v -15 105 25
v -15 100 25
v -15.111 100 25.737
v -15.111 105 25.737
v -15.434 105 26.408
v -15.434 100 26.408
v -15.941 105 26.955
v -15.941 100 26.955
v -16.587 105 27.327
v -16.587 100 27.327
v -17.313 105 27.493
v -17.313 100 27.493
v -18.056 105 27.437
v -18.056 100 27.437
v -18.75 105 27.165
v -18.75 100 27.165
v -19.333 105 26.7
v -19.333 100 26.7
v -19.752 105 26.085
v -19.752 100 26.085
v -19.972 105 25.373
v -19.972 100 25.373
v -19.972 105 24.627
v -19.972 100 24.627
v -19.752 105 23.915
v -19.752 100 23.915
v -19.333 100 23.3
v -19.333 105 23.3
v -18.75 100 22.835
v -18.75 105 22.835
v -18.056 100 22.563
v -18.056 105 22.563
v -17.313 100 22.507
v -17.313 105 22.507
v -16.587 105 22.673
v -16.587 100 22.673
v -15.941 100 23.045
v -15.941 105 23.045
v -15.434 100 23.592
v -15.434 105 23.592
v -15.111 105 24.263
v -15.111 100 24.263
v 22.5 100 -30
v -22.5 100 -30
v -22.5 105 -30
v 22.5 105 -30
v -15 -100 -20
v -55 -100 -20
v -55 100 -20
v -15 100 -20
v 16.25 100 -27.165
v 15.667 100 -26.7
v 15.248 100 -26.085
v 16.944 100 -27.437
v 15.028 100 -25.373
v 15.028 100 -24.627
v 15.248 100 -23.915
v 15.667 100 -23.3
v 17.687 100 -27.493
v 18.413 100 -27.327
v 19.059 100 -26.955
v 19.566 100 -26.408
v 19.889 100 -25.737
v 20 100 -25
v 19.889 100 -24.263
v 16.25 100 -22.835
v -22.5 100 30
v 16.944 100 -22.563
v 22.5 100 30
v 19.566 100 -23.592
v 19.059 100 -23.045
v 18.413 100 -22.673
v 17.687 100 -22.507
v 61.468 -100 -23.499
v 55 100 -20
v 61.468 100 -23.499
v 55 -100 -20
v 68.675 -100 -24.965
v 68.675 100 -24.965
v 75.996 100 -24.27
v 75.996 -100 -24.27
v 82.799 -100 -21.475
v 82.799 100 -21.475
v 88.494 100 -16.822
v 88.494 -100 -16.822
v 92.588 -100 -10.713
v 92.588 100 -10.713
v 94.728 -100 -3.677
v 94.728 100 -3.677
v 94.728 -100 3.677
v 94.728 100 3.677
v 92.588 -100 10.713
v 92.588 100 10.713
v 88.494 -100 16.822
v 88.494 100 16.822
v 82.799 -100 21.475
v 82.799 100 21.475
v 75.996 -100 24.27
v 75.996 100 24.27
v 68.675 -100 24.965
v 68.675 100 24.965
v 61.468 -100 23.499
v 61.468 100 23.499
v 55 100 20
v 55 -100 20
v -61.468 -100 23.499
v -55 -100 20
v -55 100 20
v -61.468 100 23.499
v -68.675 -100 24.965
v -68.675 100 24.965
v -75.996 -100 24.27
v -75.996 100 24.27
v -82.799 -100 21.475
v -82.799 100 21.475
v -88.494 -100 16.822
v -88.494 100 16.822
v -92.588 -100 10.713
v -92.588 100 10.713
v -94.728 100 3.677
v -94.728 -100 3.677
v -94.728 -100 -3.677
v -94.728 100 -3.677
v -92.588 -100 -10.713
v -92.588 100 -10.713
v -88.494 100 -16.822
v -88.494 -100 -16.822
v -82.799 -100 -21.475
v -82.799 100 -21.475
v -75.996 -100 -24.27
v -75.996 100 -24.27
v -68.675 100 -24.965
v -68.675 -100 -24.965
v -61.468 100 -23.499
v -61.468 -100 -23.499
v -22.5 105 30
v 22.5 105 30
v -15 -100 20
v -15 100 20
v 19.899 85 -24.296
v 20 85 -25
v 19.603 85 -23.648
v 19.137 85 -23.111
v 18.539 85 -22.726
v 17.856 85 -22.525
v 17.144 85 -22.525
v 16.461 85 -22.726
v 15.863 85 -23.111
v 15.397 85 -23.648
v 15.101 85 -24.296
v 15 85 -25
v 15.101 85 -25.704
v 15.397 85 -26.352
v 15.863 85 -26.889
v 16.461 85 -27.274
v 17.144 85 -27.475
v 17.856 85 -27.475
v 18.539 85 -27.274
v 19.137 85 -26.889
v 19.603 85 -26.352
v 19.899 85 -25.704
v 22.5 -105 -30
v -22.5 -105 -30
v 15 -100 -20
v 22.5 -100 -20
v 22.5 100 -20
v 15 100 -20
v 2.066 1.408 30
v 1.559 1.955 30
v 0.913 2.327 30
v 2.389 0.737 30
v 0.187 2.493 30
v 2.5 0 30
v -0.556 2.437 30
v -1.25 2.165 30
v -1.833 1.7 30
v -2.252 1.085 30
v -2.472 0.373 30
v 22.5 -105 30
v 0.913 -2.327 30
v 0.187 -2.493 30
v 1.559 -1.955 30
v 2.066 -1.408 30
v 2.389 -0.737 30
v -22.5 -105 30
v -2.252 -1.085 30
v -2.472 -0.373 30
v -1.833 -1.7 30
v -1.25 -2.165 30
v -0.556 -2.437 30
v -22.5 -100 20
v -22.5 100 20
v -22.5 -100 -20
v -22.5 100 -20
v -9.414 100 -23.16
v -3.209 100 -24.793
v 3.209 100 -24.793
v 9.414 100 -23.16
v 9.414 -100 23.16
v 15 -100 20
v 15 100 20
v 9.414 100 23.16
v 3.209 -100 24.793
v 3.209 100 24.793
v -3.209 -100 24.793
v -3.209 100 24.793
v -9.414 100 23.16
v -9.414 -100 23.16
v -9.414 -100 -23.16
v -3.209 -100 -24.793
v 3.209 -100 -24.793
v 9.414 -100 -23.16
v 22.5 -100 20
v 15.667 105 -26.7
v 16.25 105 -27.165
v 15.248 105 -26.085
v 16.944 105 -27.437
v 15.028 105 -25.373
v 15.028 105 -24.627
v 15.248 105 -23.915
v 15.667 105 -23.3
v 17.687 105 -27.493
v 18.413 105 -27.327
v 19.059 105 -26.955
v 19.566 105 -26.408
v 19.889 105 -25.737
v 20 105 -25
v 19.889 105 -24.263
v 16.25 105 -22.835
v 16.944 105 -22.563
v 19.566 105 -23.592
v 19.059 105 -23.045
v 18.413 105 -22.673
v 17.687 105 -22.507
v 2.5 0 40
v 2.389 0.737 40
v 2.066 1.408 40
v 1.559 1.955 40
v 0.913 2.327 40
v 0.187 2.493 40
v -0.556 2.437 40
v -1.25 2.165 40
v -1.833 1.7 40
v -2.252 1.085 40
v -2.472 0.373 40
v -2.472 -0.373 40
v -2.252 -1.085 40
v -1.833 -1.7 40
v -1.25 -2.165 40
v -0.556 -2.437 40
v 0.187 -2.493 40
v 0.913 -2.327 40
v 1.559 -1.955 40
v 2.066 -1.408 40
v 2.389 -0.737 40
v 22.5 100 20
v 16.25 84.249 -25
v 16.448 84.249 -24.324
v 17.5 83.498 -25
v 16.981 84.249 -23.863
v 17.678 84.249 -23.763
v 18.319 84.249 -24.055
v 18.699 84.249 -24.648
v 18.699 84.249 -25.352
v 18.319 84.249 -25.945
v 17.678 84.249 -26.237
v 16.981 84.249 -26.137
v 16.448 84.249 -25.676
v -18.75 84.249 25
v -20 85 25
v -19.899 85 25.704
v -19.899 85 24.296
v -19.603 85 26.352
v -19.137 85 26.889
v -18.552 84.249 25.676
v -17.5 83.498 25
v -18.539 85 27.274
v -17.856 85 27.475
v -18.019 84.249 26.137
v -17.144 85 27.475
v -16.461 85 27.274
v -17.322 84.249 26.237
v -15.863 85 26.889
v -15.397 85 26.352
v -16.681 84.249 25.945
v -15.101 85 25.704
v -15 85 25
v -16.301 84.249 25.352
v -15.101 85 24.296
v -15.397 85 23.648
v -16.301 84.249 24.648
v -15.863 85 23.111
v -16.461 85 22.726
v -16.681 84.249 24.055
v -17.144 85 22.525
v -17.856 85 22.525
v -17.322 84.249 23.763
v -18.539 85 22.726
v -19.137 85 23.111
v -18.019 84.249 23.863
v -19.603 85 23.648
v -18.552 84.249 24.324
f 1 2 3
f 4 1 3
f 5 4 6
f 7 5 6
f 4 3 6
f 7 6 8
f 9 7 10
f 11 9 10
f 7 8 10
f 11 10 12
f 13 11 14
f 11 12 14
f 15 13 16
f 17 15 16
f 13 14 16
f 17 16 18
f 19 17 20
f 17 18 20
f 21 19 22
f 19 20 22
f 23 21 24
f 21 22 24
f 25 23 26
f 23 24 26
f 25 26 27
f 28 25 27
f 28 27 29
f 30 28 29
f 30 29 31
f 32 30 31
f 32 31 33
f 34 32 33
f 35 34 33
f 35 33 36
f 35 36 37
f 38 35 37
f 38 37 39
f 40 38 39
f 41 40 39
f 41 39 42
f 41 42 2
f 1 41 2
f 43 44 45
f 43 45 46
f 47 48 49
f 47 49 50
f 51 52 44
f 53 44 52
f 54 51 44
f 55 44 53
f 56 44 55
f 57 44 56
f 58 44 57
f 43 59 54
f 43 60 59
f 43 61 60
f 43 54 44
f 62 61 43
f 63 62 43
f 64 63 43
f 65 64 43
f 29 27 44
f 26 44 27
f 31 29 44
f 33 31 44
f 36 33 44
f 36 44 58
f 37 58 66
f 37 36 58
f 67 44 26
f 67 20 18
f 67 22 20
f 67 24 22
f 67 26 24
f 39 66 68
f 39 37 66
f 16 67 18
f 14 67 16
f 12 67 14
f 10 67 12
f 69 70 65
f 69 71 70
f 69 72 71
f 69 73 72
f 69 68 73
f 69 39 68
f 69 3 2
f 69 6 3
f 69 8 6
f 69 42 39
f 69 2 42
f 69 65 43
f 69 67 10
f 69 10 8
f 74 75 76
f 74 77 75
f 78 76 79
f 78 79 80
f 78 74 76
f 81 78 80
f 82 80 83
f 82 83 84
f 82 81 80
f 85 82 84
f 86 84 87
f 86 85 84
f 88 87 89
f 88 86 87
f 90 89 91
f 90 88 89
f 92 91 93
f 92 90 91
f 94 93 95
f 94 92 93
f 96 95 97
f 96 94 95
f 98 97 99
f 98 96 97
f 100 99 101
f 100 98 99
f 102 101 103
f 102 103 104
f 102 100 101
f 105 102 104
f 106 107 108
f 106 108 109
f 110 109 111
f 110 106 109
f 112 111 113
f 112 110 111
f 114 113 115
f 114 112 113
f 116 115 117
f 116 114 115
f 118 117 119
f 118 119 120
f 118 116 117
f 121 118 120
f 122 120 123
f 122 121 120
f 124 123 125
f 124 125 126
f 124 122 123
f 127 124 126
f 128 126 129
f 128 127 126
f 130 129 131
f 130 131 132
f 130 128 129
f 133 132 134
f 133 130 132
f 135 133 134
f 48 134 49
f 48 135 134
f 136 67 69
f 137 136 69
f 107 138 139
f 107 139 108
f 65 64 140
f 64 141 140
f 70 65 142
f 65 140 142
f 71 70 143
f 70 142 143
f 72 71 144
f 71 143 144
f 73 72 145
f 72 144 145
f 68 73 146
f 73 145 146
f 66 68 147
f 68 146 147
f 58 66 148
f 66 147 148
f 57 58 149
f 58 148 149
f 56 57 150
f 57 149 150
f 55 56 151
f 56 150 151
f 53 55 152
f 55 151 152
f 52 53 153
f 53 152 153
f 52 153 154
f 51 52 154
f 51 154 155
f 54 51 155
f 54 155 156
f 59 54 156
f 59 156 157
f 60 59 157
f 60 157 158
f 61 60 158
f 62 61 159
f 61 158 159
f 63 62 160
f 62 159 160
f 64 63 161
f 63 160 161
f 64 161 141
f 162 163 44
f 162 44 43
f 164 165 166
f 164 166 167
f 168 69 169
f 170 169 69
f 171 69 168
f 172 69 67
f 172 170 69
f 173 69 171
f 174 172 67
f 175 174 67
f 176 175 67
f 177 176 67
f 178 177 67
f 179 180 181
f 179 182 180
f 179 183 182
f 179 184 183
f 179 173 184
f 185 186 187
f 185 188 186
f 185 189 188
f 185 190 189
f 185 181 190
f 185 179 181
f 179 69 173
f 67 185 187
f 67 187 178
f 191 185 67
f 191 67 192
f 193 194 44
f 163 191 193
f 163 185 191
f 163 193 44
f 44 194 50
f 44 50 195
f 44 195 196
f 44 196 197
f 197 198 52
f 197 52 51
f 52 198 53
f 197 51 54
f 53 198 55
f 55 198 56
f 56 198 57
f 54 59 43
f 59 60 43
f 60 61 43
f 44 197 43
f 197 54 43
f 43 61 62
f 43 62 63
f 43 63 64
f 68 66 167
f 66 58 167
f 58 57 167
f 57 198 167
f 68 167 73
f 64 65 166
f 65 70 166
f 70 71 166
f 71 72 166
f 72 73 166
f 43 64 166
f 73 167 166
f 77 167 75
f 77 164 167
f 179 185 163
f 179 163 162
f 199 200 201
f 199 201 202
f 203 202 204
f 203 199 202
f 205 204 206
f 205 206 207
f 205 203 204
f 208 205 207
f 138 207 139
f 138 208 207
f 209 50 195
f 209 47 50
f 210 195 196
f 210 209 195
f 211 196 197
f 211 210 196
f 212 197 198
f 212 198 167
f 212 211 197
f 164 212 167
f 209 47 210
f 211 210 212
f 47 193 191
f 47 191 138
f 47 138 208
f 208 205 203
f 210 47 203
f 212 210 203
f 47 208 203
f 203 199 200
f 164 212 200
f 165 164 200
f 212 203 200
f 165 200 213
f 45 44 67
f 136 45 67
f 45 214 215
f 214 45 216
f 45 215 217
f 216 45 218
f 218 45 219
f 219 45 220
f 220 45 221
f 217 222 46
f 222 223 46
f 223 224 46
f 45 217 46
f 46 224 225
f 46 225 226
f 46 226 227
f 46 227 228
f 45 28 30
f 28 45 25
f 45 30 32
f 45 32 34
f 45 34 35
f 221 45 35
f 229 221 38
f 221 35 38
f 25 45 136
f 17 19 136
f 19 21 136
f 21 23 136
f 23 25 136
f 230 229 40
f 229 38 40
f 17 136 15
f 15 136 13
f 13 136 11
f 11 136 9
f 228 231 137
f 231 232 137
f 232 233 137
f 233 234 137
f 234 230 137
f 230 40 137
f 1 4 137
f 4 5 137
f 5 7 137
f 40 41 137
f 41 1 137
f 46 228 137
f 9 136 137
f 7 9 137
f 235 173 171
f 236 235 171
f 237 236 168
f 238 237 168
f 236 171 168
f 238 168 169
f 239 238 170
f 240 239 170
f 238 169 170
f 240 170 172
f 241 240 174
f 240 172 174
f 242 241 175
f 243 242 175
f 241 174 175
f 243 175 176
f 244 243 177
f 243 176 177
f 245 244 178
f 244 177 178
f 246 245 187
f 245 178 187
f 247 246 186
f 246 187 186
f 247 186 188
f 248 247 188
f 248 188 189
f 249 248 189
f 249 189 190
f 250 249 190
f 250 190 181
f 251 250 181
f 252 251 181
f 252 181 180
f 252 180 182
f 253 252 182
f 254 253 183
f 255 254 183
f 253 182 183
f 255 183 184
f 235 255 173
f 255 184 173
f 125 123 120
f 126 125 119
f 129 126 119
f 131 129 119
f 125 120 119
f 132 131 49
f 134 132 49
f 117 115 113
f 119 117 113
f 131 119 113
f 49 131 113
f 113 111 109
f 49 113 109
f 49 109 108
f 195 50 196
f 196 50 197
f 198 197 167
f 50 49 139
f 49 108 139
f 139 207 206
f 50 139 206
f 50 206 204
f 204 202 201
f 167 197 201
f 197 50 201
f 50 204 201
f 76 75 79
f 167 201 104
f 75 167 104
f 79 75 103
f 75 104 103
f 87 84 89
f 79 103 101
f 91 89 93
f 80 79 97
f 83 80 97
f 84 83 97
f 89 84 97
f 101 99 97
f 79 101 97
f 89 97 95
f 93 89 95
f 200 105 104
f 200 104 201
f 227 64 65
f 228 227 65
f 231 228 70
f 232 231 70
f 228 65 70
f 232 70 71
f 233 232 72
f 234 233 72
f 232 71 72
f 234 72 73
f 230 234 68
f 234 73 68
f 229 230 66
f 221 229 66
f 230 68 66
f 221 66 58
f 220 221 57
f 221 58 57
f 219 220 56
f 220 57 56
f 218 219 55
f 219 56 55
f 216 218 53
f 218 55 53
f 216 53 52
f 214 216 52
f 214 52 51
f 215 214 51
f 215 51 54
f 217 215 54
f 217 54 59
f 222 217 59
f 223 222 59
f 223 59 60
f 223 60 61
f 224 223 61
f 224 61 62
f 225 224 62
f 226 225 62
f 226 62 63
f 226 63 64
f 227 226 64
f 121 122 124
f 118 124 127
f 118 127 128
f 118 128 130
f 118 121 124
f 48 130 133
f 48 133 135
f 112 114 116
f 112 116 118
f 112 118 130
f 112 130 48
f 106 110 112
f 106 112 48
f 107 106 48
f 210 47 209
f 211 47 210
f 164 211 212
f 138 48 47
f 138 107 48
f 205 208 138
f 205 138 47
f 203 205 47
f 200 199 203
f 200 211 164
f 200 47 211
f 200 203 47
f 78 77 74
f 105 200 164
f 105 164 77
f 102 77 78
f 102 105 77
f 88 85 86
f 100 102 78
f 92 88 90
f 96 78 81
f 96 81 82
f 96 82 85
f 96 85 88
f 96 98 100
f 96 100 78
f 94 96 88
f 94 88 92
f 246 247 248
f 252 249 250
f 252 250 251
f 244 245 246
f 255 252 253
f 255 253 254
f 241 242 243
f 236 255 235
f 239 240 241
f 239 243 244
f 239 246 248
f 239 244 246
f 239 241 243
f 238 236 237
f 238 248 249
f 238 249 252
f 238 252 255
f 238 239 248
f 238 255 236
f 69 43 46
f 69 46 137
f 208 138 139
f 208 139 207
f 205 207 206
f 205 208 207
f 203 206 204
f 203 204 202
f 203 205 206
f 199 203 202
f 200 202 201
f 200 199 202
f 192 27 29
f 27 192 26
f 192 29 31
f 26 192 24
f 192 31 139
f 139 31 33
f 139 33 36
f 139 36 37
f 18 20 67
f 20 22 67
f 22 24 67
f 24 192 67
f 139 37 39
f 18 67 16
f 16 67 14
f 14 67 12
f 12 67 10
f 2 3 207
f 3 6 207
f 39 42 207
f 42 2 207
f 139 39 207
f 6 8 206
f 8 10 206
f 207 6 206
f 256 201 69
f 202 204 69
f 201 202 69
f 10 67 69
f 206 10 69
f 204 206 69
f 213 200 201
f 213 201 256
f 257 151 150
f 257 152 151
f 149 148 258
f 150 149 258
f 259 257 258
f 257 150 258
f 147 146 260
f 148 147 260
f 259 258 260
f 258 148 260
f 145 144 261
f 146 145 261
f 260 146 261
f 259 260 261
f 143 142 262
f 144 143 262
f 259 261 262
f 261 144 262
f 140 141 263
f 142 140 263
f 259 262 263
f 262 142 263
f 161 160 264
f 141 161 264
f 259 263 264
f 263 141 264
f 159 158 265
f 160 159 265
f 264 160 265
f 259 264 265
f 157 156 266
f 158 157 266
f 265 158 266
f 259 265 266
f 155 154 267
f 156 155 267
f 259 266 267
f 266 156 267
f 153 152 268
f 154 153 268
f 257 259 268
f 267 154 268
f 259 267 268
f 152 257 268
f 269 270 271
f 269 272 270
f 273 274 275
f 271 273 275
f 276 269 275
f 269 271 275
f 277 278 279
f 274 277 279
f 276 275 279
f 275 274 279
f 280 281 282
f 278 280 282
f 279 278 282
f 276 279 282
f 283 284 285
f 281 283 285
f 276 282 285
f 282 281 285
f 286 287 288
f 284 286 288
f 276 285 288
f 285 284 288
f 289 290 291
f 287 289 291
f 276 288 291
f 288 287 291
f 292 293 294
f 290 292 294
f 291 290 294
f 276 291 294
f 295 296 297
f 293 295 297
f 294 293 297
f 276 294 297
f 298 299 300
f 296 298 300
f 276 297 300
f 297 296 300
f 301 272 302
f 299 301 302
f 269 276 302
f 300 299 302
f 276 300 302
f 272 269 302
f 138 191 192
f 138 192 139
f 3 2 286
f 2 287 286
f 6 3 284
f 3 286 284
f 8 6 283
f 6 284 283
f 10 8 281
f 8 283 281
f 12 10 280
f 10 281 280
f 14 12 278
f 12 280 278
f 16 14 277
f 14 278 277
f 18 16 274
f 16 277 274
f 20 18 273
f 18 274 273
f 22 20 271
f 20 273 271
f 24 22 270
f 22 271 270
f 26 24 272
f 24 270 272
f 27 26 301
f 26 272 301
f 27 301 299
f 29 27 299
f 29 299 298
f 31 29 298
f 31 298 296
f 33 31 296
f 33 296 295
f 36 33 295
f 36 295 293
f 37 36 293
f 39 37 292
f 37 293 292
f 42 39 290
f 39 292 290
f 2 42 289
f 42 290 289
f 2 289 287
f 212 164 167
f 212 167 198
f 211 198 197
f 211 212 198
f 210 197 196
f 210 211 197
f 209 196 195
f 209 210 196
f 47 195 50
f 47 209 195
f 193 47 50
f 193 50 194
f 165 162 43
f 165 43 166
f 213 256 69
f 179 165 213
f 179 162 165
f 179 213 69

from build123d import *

# Parameters (mm, degrees)
F1_DEPTH   = 100
F3_DEPTH   = 105
F5_DEPTH   = 5
F6_START   = -205
F4_W       = 45
F4_H       = 60
F6_DEPTH   = 5
F7_DEPTH   = 5
F9_D       = 5
F9_DEPTH   = 20
F9_TIP     = 1.5021515476
F9_2_D     = 5
F9_2_DEPTH = 20
F9_2_TIP   = 1.5021515476
F10_R      = 2.5
F11_DEPTH  = 10


with BuildPart() as f1:
    # F0 (on Front) → F1 (new body, symmetric)
    with BuildSketch(Plane.XZ):
        with BuildLine():
            ThreePointArc((55, -20), (81.1803398875, -22.360679775), (95, 0))
            ThreePointArc((95, 0), (81.1803398875, 22.360679775), (55, 20))
            Line((55, 20), (70, 20))
            Line((70, 20), (70, -20))
            Line((70, -20), (55, -20))
        make_face()
        with BuildLine():
            Line((70, 20), (55, 20))
            ThreePointArc((55, 20), (45, 0), (55, -20))
            Line((55, -20), (70, -20))
            Line((70, -20), (70, 20))
        make_face()
        with BuildLine():
            ThreePointArc((55, -20), (45, 0), (55, 20))
            Line((55, 20), (15, 20))
            ThreePointArc((15, 20), (22.360679775, 11.1803398875), (25, 0))
            ThreePointArc((25, 0), (22.360679775, -11.1803398875), (15, -20))
            Line((15, -20), (55, -20))
        make_face()
        with BuildLine():
            Line((-15, 20), (15, 20))
            ThreePointArc((15, 20), (0, 25), (-15, 20))
        make_face()
        with BuildLine():
            ThreePointArc((25, 0), (22.360679775, 11.1803398875), (15, 20))
            Line((15, 20), (-15, 20))
            ThreePointArc((-15, 20), (-25, 0), (-15, -20))
            Line((-15, -20), (15, -20))
            ThreePointArc((15, -20), (22.360679775, -11.1803398875), (25, 0))
        make_face()
        with BuildLine():
            ThreePointArc((-15, -20), (0, -25), (15, -20))
            Line((15, -20), (-15, -20))
        make_face()
        with BuildLine():
            ThreePointArc((-15, -20), (-25, 0), (-15, 20))
            Line((-15, 20), (-55, 20))
            ThreePointArc((-55, 20), (-47.639320225, 11.1803398875), (-45, 0))
            ThreePointArc((-45, 0), (-47.639320225, -11.1803398875), (-55, -20))
            Line((-55, -20), (-15, -20))
        make_face()
        with BuildLine():
            Line((-70, 20), (-55, 20))
            ThreePointArc((-55, 20), (-95, 0), (-55, -20))
            Line((-55, -20), (-70, -20))
            Line((-70, -20), (-70, 20))
        make_face()
        with BuildLine():
            ThreePointArc((-45, 0), (-47.639320225, 11.1803398875), (-55, 20))
            Line((-55, 20), (-70, 20))
            Line((-70, 20), (-70, -20))
            Line((-70, -20), (-55, -20))
            ThreePointArc((-55, -20), (-47.639320225, -11.1803398875), (-45, 0))
        make_face()
    extrude(amount=F1_DEPTH, both=True)


with BuildPart() as f3:
    # F2 (on Front) → F3 (new body, symmetric)
    with BuildSketch(Plane.XZ):
        with BuildLine():
            Line((15, 20), (22.5, 20))
            Line((22.5, 20), (22.5, 30))
            Line((22.5, 30), (-22.5, 30))
            Line((-22.5, 30), (-22.5, 20))
            Line((-22.5, 20), (-15, 20))
            ThreePointArc((-15, 20), (0, 25), (15, 20))
        make_face()
    extrude(amount=F3_DEPTH, both=True)



with BuildPart() as f3b:
    # F2 (on Front) → F3, piece 2 (new body, symmetric)
    with BuildSketch(Plane.XZ):
        with BuildLine():
            Line((22.5, -30), (22.5, -20))
            Line((22.5, -20), (15, -20))
            ThreePointArc((15, -20), (0, -25), (-15, -20))
            Line((-15, -20), (-22.5, -20))
            Line((-22.5, -20), (-22.5, -30))
            Line((-22.5, -30), (22.5, -30))
        make_face()
    extrude(amount=F3_DEPTH, both=True)


with BuildPart() as f3_1:
    add(f3.part)

    add(f3b.part)  # F5 merges F3b
    # F4 (on face) → F5 (join)
    with BuildSketch(Plane.XZ.offset(105)):
        with BuildLine():
            Line((-15, 20), (-22.5, 20))
            Line((-22.5, 20), (-22.5, -30))
            Line((-22.5, -30), (22.5, -30))
            Line((22.5, -30), (22.5, 20))
            Line((22.5, 20), (15, 20))
            ThreePointArc((15, 20), (0, 25), (-15, 20))
        make_face()
    extrude(amount=-F5_DEPTH)

    # F7 (cut): faces of the model
    f7_faces = [f3_1.faces().sort_by_distance(p)[0] for p in [
        (0, 105, 25.8760623382),
        (0, 105, -25.8760623382),
    ]]
    extrude(f7_faces, amount=-F7_DEPTH, mode=Mode.SUBTRACT)

    # F9
    with Locations(Plane(origin=(0, 105, 0), x_dir=(-1, 0, 0), z_dir=(0, 1, 0))):
        with Locations((-17.5, -25), (17.5, 25)):
            Hole(F9_D / 2, depth=F9_DEPTH)
            with Locations((0, 0, -(F9_DEPTH + F9_TIP / 2))):  # 118° drill point
                Cone(0, F9_D / 2, F9_TIP, mode=Mode.SUBTRACT)

    # F10 (on face) → F11 (join)
    with BuildSketch(Plane.XY.offset(30)):
        Circle(F10_R)
    extrude(amount=F11_DEPTH)


with BuildPart() as f6:
    # F4 (on face) → F6 (new body)
    with BuildSketch(Plane.XZ.offset(105).offset(F6_START)):
        Rectangle(F4_W, F4_H)
    extrude(amount=-F6_DEPTH)

    # F9#2
    with Locations(Plane(origin=(0, 105, 0), x_dir=(-1, 0, 0), z_dir=(0, 1, 0))):
        with Locations((-17.5, -25), (17.5, 25)):
            Hole(F9_2_D / 2, depth=F9_2_DEPTH)
            with Locations((0, 0, -(F9_2_DEPTH + F9_2_TIP / 2))):  # 118° drill point
                Cone(0, F9_2_D / 2, F9_2_TIP, mode=Mode.SUBTRACT)


solid = Compound([f1.part, f3_1.part, f6.part])
